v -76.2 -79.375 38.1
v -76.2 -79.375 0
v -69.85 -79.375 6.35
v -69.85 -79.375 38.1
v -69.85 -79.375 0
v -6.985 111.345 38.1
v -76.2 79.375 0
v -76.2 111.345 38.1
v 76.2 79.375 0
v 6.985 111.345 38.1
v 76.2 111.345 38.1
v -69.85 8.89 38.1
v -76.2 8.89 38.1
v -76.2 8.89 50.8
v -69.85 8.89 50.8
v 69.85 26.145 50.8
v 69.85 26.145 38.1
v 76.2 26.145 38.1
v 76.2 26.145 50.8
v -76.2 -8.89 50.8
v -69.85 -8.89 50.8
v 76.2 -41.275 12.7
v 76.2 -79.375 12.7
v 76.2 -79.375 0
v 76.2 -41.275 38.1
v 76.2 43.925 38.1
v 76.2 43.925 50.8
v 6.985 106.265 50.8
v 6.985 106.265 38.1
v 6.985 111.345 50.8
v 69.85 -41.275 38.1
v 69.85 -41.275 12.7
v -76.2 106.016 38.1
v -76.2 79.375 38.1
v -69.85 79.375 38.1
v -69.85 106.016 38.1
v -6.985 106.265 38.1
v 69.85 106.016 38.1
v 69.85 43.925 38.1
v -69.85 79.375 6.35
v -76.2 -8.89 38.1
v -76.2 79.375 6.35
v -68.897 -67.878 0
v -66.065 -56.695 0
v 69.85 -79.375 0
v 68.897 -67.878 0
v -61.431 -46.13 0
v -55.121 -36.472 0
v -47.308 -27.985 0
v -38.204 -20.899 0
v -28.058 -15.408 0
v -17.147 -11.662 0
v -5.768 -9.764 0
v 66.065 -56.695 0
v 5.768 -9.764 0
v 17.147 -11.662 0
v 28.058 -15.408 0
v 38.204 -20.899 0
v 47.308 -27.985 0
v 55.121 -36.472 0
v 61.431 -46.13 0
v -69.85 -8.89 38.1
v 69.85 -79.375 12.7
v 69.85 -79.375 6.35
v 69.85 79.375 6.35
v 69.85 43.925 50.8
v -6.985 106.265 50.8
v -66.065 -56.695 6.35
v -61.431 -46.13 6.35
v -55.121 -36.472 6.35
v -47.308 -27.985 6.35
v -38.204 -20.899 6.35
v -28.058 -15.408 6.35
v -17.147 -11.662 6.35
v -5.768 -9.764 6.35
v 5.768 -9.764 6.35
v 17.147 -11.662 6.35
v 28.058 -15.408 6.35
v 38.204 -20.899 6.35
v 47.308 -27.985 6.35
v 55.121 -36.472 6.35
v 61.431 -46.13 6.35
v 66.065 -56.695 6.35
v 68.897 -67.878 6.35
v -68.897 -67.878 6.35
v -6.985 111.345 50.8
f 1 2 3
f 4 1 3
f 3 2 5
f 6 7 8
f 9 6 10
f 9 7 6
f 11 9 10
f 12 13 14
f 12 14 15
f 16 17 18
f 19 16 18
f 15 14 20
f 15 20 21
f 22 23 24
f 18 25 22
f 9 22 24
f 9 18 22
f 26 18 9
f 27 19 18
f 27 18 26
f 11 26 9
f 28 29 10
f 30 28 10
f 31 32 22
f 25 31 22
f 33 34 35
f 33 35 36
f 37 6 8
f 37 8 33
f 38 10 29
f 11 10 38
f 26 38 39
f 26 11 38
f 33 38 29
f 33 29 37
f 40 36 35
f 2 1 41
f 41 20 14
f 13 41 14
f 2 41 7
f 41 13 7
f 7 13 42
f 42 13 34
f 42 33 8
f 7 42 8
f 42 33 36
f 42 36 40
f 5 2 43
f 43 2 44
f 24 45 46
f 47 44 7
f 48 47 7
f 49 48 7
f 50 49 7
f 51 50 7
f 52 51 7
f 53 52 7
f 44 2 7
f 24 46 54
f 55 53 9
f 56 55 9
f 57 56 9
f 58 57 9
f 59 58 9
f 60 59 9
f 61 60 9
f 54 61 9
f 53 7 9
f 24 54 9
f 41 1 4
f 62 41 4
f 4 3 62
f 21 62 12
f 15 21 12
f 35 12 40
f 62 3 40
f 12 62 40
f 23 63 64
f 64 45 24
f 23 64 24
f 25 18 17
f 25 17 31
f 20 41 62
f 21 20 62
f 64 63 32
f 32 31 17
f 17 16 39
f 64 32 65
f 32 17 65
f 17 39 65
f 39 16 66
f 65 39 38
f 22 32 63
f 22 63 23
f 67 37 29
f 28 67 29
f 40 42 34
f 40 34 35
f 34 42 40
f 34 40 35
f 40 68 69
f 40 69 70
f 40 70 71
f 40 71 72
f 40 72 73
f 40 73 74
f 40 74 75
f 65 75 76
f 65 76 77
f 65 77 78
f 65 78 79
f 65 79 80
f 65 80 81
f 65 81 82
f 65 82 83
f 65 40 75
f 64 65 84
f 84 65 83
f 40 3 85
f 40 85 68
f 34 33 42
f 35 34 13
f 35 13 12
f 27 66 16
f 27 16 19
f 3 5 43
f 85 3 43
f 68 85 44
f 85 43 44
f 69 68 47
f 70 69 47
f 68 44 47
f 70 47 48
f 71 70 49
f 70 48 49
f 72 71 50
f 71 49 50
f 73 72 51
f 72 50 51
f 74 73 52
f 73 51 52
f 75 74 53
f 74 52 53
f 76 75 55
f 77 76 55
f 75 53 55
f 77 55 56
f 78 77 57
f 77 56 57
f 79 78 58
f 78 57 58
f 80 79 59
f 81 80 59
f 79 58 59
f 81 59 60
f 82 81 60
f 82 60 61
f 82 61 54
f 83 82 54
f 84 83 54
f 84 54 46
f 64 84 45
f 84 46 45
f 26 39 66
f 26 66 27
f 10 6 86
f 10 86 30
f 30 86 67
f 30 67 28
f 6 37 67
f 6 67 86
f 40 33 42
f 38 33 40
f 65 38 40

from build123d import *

# Parameters (mm, degrees)
F1_DEPTH  = 6.35
F0_W      = 6.35
F0_H      = 158.75
F2_DEPTH  = 38.1
F4_DEPTH  = 152.4
F5_DEPTH  = 6.35
F7_DEPTH  = 6.35
F8_W      = 6.35
F8_H      = 25.4
F9_DEPTH  = 38.1
F11_W     = 6.35
F11_H     = 17.78
F10_W     = 6.35
F10_H     = 17.78
F10_W_2   = 13.97
F10_H_2   = 5.08
F12_DEPTH = 12.7


with BuildPart() as f1:
    # F0 (on Top) → F1 (new body)
    with BuildSketch(Plane.XY):
        with BuildLine():
            Line((69.85, -79.375), (69.85, 79.375))
            Line((69.85, 79.375), (-69.85, 79.375))
            Line((-69.85, 79.375), (-69.85, -79.375))
            ThreePointArc((-69.85, -79.375), (0, -9.525), (69.85, -79.375))
        make_face()
    extrude(amount=F1_DEPTH)

    # F0 (on Top) → F2 (join)
    with BuildSketch(Plane.XY):
        with Locations((73.025, 0)):
            Rectangle(F0_W, F0_H)
        with Locations((-73.025, 0)):
            Rectangle(F0_W, F0_H)
    extrude(amount=F2_DEPTH)

    # F3 (on face) → F4 (join)
    with BuildSketch(Plane.YZ.offset(76.2)):
        Polygon((79.375, 6.35), (79.375, 0), (111.344696, 38.1), (106.016413, 38.1), align=None)
    extrude(amount=-F4_DEPTH)

    # F3 (on face) → F5 (join)
    with BuildSketch(Plane.YZ.offset(76.2)):
        Polygon((79.375, 38.1), (79.375, 6.35), (106.016413, 38.1), align=None)
    extrude(amount=-F5_DEPTH)

    # F8 (on face) → F9 (cut)
    with BuildSketch(Plane.XZ.offset(79.375)):
        with Locations((73.025, 25.4)):
            Rectangle(F8_W, F8_H)
    extrude(amount=-F9_DEPTH, mode=Mode.SUBTRACT)

    # F11 (on face) + F10 (on face) → F12 (join)
    with BuildSketch(Plane.XY.offset(38.1)):
        with Locations((-73.025, 0)):
            Rectangle(F11_W, F11_H)
    with BuildSketch(Plane.XY.offset(38.1)):
        with Locations((73.025, 35.034848)):
            Rectangle(F10_W, F10_H)
        with Locations((0, 108.804696)):
            Rectangle(F10_W_2, F10_H_2)
    extrude(amount=F12_DEPTH)


with BuildPart() as f7:
    # F6 (on face) → F7 (new body)
    with BuildSketch(Plane(origin=(-76.2, 0, 0), x_dir=(0, -1, 0), z_dir=(-1, 0, 0))):
        Polygon((-79.375, 6.35), (-79.375, 38.1), (-106.016413, 38.1), align=None)
    extrude(amount=-F7_DEPTH)


solid = Compound([f1.part, f7.part])
